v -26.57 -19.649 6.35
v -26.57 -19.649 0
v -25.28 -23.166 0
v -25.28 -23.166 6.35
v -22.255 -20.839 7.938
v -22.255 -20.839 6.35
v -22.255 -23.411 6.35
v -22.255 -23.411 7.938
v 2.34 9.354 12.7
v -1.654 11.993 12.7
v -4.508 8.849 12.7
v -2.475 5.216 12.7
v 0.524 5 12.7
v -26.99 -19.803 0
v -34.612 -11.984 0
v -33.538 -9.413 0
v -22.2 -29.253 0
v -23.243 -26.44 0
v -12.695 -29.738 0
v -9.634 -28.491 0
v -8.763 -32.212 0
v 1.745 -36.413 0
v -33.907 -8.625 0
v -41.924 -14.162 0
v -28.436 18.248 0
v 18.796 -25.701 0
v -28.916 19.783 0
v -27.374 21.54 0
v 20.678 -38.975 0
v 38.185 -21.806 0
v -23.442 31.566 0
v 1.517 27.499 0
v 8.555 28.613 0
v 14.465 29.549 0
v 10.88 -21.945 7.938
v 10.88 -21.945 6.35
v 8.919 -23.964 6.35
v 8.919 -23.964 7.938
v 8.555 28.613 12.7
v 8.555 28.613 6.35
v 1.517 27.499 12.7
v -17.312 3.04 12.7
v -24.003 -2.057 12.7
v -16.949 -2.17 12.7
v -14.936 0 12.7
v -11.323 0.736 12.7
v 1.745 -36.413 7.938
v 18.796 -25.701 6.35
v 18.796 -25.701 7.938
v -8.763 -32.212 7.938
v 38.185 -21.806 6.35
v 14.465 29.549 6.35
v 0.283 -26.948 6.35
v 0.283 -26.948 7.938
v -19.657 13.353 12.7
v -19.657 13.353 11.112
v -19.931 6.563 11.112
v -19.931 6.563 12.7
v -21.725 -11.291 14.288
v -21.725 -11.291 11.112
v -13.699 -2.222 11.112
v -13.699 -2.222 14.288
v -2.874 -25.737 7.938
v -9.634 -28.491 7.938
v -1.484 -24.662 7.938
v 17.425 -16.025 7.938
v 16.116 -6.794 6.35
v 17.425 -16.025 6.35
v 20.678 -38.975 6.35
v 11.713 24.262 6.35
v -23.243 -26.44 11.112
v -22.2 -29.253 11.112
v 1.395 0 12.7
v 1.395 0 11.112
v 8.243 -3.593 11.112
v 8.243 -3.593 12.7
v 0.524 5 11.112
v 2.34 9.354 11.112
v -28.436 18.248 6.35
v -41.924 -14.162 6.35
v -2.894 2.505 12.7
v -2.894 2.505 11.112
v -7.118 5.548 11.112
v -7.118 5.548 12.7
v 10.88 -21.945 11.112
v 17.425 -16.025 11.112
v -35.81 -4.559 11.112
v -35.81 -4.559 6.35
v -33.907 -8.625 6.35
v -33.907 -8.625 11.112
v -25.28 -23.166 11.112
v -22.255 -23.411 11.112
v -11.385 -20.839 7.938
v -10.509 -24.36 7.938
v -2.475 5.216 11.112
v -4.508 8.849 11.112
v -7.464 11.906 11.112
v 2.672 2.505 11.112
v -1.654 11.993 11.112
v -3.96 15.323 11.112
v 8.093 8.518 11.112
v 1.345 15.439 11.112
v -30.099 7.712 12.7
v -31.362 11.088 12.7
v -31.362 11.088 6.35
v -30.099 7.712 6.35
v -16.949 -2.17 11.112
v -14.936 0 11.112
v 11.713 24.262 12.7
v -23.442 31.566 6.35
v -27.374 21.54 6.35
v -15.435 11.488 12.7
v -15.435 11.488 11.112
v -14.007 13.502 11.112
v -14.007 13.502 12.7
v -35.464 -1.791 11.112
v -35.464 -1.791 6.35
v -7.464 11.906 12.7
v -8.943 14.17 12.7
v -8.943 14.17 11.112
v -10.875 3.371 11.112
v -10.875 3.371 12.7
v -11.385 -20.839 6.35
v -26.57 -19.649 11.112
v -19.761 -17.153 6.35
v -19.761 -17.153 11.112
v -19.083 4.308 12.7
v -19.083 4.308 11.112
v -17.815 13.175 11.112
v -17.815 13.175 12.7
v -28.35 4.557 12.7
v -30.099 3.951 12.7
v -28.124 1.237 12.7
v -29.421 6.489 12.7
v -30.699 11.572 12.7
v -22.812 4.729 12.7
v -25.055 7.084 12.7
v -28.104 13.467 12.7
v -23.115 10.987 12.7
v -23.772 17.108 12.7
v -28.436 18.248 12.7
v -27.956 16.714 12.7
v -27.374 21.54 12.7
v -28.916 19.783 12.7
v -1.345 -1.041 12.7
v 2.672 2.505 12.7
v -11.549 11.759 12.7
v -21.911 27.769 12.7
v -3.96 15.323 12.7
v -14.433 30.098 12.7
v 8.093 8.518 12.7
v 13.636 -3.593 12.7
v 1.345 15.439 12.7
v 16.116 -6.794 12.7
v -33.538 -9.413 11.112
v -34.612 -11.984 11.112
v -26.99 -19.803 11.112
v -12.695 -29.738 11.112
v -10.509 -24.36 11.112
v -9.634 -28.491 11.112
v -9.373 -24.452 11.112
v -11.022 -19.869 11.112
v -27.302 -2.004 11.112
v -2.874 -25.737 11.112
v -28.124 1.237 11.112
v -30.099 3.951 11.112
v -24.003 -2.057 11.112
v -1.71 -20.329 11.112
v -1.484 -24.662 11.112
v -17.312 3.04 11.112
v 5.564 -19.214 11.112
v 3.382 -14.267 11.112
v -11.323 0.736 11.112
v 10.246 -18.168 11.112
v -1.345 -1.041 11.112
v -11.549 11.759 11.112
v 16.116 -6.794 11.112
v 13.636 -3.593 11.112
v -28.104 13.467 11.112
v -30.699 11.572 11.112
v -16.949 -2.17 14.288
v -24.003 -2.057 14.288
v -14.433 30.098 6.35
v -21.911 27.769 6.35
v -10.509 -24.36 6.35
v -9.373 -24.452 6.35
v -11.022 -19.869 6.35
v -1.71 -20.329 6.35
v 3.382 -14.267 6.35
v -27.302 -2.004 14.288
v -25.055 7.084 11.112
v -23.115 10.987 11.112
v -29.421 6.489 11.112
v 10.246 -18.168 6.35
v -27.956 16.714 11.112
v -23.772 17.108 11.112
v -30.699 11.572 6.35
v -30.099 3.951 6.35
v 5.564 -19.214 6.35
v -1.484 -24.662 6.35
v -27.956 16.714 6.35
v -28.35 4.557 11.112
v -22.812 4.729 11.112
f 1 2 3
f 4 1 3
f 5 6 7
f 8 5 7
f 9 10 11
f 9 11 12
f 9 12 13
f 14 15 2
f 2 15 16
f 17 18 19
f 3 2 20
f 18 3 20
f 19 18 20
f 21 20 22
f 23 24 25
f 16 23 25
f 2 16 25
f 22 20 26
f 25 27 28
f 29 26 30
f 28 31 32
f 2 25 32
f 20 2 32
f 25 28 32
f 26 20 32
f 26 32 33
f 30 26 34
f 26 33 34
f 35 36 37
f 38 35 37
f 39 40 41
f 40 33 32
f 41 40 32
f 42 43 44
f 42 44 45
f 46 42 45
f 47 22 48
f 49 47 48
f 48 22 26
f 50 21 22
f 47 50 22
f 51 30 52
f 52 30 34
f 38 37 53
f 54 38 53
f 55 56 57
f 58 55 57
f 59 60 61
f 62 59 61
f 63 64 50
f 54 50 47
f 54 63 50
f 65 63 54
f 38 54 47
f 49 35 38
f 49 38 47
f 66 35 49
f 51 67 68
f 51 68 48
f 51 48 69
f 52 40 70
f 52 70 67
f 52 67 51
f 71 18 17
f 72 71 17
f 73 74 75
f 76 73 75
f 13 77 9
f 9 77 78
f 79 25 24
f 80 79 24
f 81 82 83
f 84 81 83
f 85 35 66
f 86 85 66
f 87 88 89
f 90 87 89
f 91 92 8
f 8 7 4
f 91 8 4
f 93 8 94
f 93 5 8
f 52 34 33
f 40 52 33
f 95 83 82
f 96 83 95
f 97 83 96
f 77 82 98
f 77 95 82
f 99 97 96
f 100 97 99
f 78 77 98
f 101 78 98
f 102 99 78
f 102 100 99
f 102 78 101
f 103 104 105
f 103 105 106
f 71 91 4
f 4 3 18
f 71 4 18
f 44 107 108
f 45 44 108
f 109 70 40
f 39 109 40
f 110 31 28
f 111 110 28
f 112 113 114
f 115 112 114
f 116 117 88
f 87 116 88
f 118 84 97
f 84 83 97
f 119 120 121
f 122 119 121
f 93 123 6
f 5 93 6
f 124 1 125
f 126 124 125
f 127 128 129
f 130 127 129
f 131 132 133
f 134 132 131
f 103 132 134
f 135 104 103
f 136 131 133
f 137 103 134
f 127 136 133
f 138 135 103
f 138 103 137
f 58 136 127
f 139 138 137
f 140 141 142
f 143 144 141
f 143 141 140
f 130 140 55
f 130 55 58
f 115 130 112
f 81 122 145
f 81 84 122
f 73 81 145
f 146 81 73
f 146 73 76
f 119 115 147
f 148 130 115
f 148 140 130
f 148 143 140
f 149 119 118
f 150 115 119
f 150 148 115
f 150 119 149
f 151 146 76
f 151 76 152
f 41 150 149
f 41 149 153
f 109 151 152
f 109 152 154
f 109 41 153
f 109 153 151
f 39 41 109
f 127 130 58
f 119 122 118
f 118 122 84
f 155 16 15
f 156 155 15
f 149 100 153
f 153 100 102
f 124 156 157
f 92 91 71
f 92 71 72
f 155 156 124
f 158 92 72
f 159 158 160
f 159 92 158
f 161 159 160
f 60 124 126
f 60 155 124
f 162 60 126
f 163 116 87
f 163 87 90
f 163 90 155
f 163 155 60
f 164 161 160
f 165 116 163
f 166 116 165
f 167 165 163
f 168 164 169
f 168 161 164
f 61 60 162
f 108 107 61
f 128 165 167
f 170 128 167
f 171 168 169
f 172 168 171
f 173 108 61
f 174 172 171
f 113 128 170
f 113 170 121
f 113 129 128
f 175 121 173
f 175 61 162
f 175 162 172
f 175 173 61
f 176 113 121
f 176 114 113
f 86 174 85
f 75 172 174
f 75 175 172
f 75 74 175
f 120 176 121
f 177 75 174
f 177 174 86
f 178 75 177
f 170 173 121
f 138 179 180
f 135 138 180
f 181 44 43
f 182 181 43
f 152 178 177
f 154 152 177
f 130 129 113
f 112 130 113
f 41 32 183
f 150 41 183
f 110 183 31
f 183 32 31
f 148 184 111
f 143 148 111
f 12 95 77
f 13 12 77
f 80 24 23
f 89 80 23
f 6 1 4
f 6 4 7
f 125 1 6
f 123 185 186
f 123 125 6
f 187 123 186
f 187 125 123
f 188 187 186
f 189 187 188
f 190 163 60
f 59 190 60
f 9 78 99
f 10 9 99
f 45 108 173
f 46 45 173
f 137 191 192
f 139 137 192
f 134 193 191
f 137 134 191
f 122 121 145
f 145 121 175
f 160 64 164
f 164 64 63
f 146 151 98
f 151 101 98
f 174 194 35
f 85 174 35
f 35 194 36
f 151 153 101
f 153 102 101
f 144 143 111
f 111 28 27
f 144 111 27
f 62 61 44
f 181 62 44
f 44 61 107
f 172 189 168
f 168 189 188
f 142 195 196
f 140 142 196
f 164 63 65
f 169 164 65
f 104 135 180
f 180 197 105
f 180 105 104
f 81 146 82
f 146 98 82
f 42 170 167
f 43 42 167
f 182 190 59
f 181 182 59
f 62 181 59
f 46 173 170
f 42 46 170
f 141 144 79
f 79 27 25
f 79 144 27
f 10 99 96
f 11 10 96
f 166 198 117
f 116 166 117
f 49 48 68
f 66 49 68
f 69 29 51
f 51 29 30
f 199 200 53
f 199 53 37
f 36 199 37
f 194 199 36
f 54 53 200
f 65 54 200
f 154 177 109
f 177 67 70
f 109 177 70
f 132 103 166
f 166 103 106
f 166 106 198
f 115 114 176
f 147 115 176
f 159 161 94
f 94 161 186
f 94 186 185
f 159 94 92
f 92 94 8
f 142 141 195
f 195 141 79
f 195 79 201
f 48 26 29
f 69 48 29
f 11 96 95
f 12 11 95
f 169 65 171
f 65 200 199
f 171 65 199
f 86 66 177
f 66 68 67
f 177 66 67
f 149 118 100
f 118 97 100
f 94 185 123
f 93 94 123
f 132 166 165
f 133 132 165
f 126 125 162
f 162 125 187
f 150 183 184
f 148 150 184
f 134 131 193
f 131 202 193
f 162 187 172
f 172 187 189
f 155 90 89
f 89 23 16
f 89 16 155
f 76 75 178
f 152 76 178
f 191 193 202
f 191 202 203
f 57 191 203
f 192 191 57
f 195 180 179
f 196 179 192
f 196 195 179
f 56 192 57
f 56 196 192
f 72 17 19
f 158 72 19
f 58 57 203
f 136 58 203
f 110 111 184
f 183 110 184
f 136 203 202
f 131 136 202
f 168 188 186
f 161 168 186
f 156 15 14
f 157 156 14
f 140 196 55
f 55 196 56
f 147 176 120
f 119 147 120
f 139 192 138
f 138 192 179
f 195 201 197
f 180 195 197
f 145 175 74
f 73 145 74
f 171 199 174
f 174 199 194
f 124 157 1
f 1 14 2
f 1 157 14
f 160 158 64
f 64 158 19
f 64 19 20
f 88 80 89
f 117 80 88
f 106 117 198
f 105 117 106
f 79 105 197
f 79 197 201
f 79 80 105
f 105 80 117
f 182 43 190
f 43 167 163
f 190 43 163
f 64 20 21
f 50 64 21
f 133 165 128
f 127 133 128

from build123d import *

# Parameters (mm, degrees)
F1_DEPTH = 6.35
F2_DEPTH = 7.9375
F3_DEPTH = 9.525
F4_DEPTH = 11.1125
F5_DEPTH = 12.7
F6_DEPTH = 14.2875
F7_DEPTH = 1.5875
F8_DEPTH = 1.5875


with BuildPart() as f1:
    # F0 (on Top) → F1 (new body)
    with BuildSketch(Plane.XY):
        Polygon((-35.8103439212, -4.5593217947), (-33.9071340859, -8.6252652109), (-33.5384329894, -9.412943883), (-34.6120148897, -11.9838882238), (-26.9895140082, -19.8032855988), (-26.5695869222, -19.6492926364), (-19.7610929608, -17.1525254846), (-11.0217193142, -19.8685638607), (3.3818825614, -14.2671633512), (-1.7102999846, -20.329285413), (-9.3728229403, -24.4515277445), (-10.5090038238, -24.3597326853), (-22.254801242, -23.410758639), (-25.2798311412, -23.1663584709), (-23.24295789, -26.4399051666), (-22.2002733499, -29.25273031), (-12.6948654652, -29.7376997769), (-9.6338509958, -28.4906197353), (-2.8742274735, -25.7366988808), (-1.4843321561, -24.6623260829), (5.5642467923, -19.2138571292), (10.2457571775, -18.1676670909), (10.8801592141, -21.945245564), (17.4245349995, -16.0254287724), (16.1157045513, -6.7941471934), (13.6357676238, -3.5932986066), (8.2433465868, -3.5932986066), (1.394683728, 0), (-1.3447812526, -1.0412705597), (-10.875236243, 3.3707101829), (-8.9431926608, 14.169969596), (-11.5485337064, 11.7590313642), (-14.0071965859, 13.5024469656), (-15.4354972765, 11.4881768823), (-17.8145058453, 13.1751103327), (-19.0833117813, 4.3078940362), (-28.1235463917, 1.2368093012), (-30.0988443196, 3.9512561634), (-35.4643054307, -1.7910201568), align=None)
        Polygon((-13.6989112943, -2.2222886328), (-21.7251610011, -11.2912235782), (-27.302313596, -2.0040527452), (-24.003424822, -2.0569759701), (-17.311938107, 3.0396326911), (-11.3225607201, 0.7360266754), (-14.9355856702, 0), (-16.9485407512, -2.1701556624), align=None, mode=Mode.SUBTRACT)
        Polygon((-27.3744759216, 21.5401743719), (-28.9157517254, 19.7830181569), (-28.4356558695, 18.2484276593), (-27.9555600137, 16.7138371617), (-23.7718690187, 17.1082001179), (-19.6567643434, 13.3531671017), (-19.9311058968, 6.5632439218), (-22.8116791695, 4.7285929322), (-28.3499248326, 4.5571303926), (-29.4209925105, 6.4892523833), (-30.0988443196, 7.7120438218), (-30.0988443196, 3.9512561634), (-28.1235463917, 1.2368093012), (-19.0833117813, 4.3078940362), (-17.8145058453, 13.1751103327), (-15.4354972765, 11.4881768823), (-14.0071965859, 13.5024469656), (-11.5485337064, 11.7590313642), (-8.9431926608, 14.169969596), (-10.875236243, 3.3707101829), (-1.3447812526, -1.0412705597), (1.394683728, 0), (8.2433465868, -3.5932986066), (13.6357676238, -3.5932986066), (16.1157045513, -6.7941471934), (11.7125554425, 24.2616013296), (8.5552403661, 28.6131991288), (1.5173847093, 27.499334136), (-14.4329823518, 30.0980165206), (-21.9111200422, 27.7687609196), align=None)
        Polygon((-7.1180537343, 5.5476040579), (-7.4640917592, 11.9060464203), (-3.9604599588, 15.3231685981), (1.3454514556, 15.4385138303), (8.0931866542, 8.5177607834), (2.6719293091, 2.5053559802), (-2.8935102746, 2.5053559802), align=None, mode=Mode.SUBTRACT)
        Polygon((14.4653307977, 29.548575351), (8.5552403661, 28.6131991288), (11.7125554425, 24.2616013296), (16.1157045513, -6.7941471934), (17.4245349995, -16.0254287724), (18.7963797011, -25.7011547155), (20.6783857611, -38.9750878654), (38.1850010487, -21.8061160352), align=None)
        Polygon((18.7963797011, -25.7011547155), (17.4245349995, -16.0254287724), (10.8801592141, -21.945245564), (8.9192790911, -23.9637978375), (0.2827544813, -26.9483719021), (-1.4843321561, -24.6623260829), (-2.8742274735, -25.7366988808), (-9.6338509958, -28.4906197353), (-8.7630180642, -32.2120897472), (1.7449631123, -36.4130362868), align=None)
        Polygon((-3.9604599588, 15.3231685981), (-7.4640917592, 11.9060464203), (-7.1180537343, 5.5476040579), (-2.8935102746, 2.5053559802), (2.6719293091, 2.5053559802), (8.0931866542, 8.5177607834), (1.3454514556, 15.4385138303), align=None)
        Polygon((-2.4753811304, 5.2159847692), (-4.5083528385, 8.8493805379), (-1.6535416944, 11.9925569743), (2.3403100204, 9.3540186062), (0.5236121942, 4.9997111782), align=None, mode=Mode.SUBTRACT)
        Polygon((-19.7610929608, -17.1525254846), (-26.5695869222, -19.6492926364), (-25.2798311412, -23.1663584709), (-22.254801242, -23.410758639), (-22.254801242, -20.8385027945), (-11.3854473457, -20.8385027945), (-10.5090038238, -24.3597326853), (-9.3728229403, -24.4515277445), (-1.7102999846, -20.329285413), (3.3818825614, -14.2671633512), (-11.0217193142, -19.8685638607), align=None)
        Polygon((-27.9555600137, 16.7138371617), (-28.4356558695, 18.2484276593), (-41.9236756861, -14.1618680209), (-33.9071340859, -8.6252652109), (-35.8103439212, -4.5593217947), (-35.4643054307, -1.7910201568), (-30.0988443196, 3.9512561634), (-30.0988443196, 7.7120438218), (-31.3622131944, 11.0882837325), (-30.6994514223, 11.5721586804), align=None)
        Polygon((-23.7718690187, 17.1082001179), (-27.9555600137, 16.7138371617), (-30.6994514223, 11.5721586804), (-28.1036924571, 13.4672932327), (-23.1149829924, 10.9873563051), (-25.0553801825, 7.0839998448), (-29.4209925105, 6.4892523833), (-28.3499248326, 4.5571303926), (-22.8116791695, 4.7285929322), (-19.9311058968, 6.5632439218), (-19.6567643434, 13.3531671017), align=None)
        Polygon((-27.302313596, -2.0040527452), (-21.7251610011, -11.2912235782), (-13.6989112943, -2.2222886328), (-16.9485407512, -2.1701556624), (-24.003424822, -2.0569759701), align=None)
        Polygon((8.9192790911, -23.9637978375), (10.8801592141, -21.945245564), (10.2457571775, -18.1676670909), (5.5642467923, -19.2138571292), (-1.4843321561, -24.6623260829), (0.2827544813, -26.9483719021), align=None)
        Polygon((-28.1036924571, 13.4672932327), (-30.6994514223, 11.5721586804), (-31.3622131944, 11.0882837325), (-30.0988443196, 7.7120438218), (-29.4209925105, 6.4892523833), (-25.0553801825, 7.0839998448), (-23.1149829924, 10.9873563051), align=None)
        Polygon((-22.254801242, -20.8385027945), (-22.254801242, -23.410758639), (-10.5090038238, -24.3597326853), (-11.3854473457, -20.8385027945), align=None)
        Polygon((-23.4421584755, 31.5658189356), (-27.3744759216, 21.5401743719), (-21.9111200422, 27.7687609196), (-14.4329823518, 30.0980165206), align=None)
        Polygon((-24.003424822, -2.0569759701), (-16.9485407512, -2.1701556624), (-14.9355856702, 0), (-11.3225607201, 0.7360266754), (-17.311938107, 3.0396326911), align=None)
        Polygon((-1.6535416944, 11.9925569743), (-4.5083528385, 8.8493805379), (-2.4753811304, 5.2159847692), (0.5236121942, 4.9997111782), (2.3403100204, 9.3540186062), align=None)
    extrude(amount=F1_DEPTH)

    # F0 (on Top) → F2 (join)
    with BuildSketch(Plane.XY):
        Polygon((-35.8103439212, -4.5593217947), (-33.9071340859, -8.6252652109), (-33.5384329894, -9.412943883), (-34.6120148897, -11.9838882238), (-26.9895140082, -19.8032855988), (-26.5695869222, -19.6492926364), (-19.7610929608, -17.1525254846), (-11.0217193142, -19.8685638607), (3.3818825614, -14.2671633512), (-1.7102999846, -20.329285413), (-9.3728229403, -24.4515277445), (-10.5090038238, -24.3597326853), (-22.254801242, -23.410758639), (-25.2798311412, -23.1663584709), (-23.24295789, -26.4399051666), (-22.2002733499, -29.25273031), (-12.6948654652, -29.7376997769), (-9.6338509958, -28.4906197353), (-2.8742274735, -25.7366988808), (-1.4843321561, -24.6623260829), (5.5642467923, -19.2138571292), (10.2457571775, -18.1676670909), (10.8801592141, -21.945245564), (17.4245349995, -16.0254287724), (16.1157045513, -6.7941471934), (13.6357676238, -3.5932986066), (8.2433465868, -3.5932986066), (1.394683728, 0), (-1.3447812526, -1.0412705597), (-10.875236243, 3.3707101829), (-8.9431926608, 14.169969596), (-11.5485337064, 11.7590313642), (-14.0071965859, 13.5024469656), (-15.4354972765, 11.4881768823), (-17.8145058453, 13.1751103327), (-19.0833117813, 4.3078940362), (-28.1235463917, 1.2368093012), (-30.0988443196, 3.9512561634), (-35.4643054307, -1.7910201568), align=None)
        Polygon((-13.6989112943, -2.2222886328), (-21.7251610011, -11.2912235782), (-27.302313596, -2.0040527452), (-24.003424822, -2.0569759701), (-17.311938107, 3.0396326911), (-11.3225607201, 0.7360266754), (-14.9355856702, 0), (-16.9485407512, -2.1701556624), align=None, mode=Mode.SUBTRACT)
        Polygon((-27.3744759216, 21.5401743719), (-28.9157517254, 19.7830181569), (-28.4356558695, 18.2484276593), (-27.9555600137, 16.7138371617), (-23.7718690187, 17.1082001179), (-19.6567643434, 13.3531671017), (-19.9311058968, 6.5632439218), (-22.8116791695, 4.7285929322), (-28.3499248326, 4.5571303926), (-29.4209925105, 6.4892523833), (-30.0988443196, 7.7120438218), (-30.0988443196, 3.9512561634), (-28.1235463917, 1.2368093012), (-19.0833117813, 4.3078940362), (-17.8145058453, 13.1751103327), (-15.4354972765, 11.4881768823), (-14.0071965859, 13.5024469656), (-11.5485337064, 11.7590313642), (-8.9431926608, 14.169969596), (-10.875236243, 3.3707101829), (-1.3447812526, -1.0412705597), (1.394683728, 0), (8.2433465868, -3.5932986066), (13.6357676238, -3.5932986066), (16.1157045513, -6.7941471934), (11.7125554425, 24.2616013296), (8.5552403661, 28.6131991288), (1.5173847093, 27.499334136), (-14.4329823518, 30.0980165206), (-21.9111200422, 27.7687609196), align=None)
        Polygon((-7.1180537343, 5.5476040579), (-7.4640917592, 11.9060464203), (-3.9604599588, 15.3231685981), (1.3454514556, 15.4385138303), (8.0931866542, 8.5177607834), (2.6719293091, 2.5053559802), (-2.8935102746, 2.5053559802), align=None, mode=Mode.SUBTRACT)
        Polygon((-22.254801242, -20.8385027945), (-22.254801242, -23.410758639), (-10.5090038238, -24.3597326853), (-11.3854473457, -20.8385027945), align=None)
        Polygon((-28.1036924571, 13.4672932327), (-30.6994514223, 11.5721586804), (-31.3622131944, 11.0882837325), (-30.0988443196, 7.7120438218), (-29.4209925105, 6.4892523833), (-25.0553801825, 7.0839998448), (-23.1149829924, 10.9873563051), align=None)
        Polygon((-1.6535416944, 11.9925569743), (-4.5083528385, 8.8493805379), (-2.4753811304, 5.2159847692), (0.5236121942, 4.9997111782), (2.3403100204, 9.3540186062), align=None)
        Polygon((-24.003424822, -2.0569759701), (-16.9485407512, -2.1701556624), (-14.9355856702, 0), (-11.3225607201, 0.7360266754), (-17.311938107, 3.0396326911), align=None)
        Polygon((-27.302313596, -2.0040527452), (-21.7251610011, -11.2912235782), (-13.6989112943, -2.2222886328), (-16.9485407512, -2.1701556624), (-24.003424822, -2.0569759701), align=None)
        Polygon((18.7963797011, -25.7011547155), (17.4245349995, -16.0254287724), (10.8801592141, -21.945245564), (8.9192790911, -23.9637978375), (0.2827544813, -26.9483719021), (-1.4843321561, -24.6623260829), (-2.8742274735, -25.7366988808), (-9.6338509958, -28.4906197353), (-8.7630180642, -32.2120897472), (1.7449631123, -36.4130362868), align=None)
    extrude(amount=F2_DEPTH)

    # F0 (on Top) → F3 (join)
    with BuildSketch(Plane.XY):
        Polygon((-35.8103439212, -4.5593217947), (-33.9071340859, -8.6252652109), (-33.5384329894, -9.412943883), (-34.6120148897, -11.9838882238), (-26.9895140082, -19.8032855988), (-26.5695869222, -19.6492926364), (-19.7610929608, -17.1525254846), (-11.0217193142, -19.8685638607), (3.3818825614, -14.2671633512), (-1.7102999846, -20.329285413), (-9.3728229403, -24.4515277445), (-10.5090038238, -24.3597326853), (-22.254801242, -23.410758639), (-25.2798311412, -23.1663584709), (-23.24295789, -26.4399051666), (-22.2002733499, -29.25273031), (-12.6948654652, -29.7376997769), (-9.6338509958, -28.4906197353), (-2.8742274735, -25.7366988808), (-1.4843321561, -24.6623260829), (5.5642467923, -19.2138571292), (10.2457571775, -18.1676670909), (10.8801592141, -21.945245564), (17.4245349995, -16.0254287724), (16.1157045513, -6.7941471934), (13.6357676238, -3.5932986066), (8.2433465868, -3.5932986066), (1.394683728, 0), (-1.3447812526, -1.0412705597), (-10.875236243, 3.3707101829), (-8.9431926608, 14.169969596), (-11.5485337064, 11.7590313642), (-14.0071965859, 13.5024469656), (-15.4354972765, 11.4881768823), (-17.8145058453, 13.1751103327), (-19.0833117813, 4.3078940362), (-28.1235463917, 1.2368093012), (-30.0988443196, 3.9512561634), (-35.4643054307, -1.7910201568), align=None)
        Polygon((-13.6989112943, -2.2222886328), (-21.7251610011, -11.2912235782), (-27.302313596, -2.0040527452), (-24.003424822, -2.0569759701), (-17.311938107, 3.0396326911), (-11.3225607201, 0.7360266754), (-14.9355856702, 0), (-16.9485407512, -2.1701556624), align=None, mode=Mode.SUBTRACT)
        Polygon((-27.3744759216, 21.5401743719), (-28.9157517254, 19.7830181569), (-28.4356558695, 18.2484276593), (-27.9555600137, 16.7138371617), (-23.7718690187, 17.1082001179), (-19.6567643434, 13.3531671017), (-19.9311058968, 6.5632439218), (-22.8116791695, 4.7285929322), (-28.3499248326, 4.5571303926), (-29.4209925105, 6.4892523833), (-30.0988443196, 7.7120438218), (-30.0988443196, 3.9512561634), (-28.1235463917, 1.2368093012), (-19.0833117813, 4.3078940362), (-17.8145058453, 13.1751103327), (-15.4354972765, 11.4881768823), (-14.0071965859, 13.5024469656), (-11.5485337064, 11.7590313642), (-8.9431926608, 14.169969596), (-10.875236243, 3.3707101829), (-1.3447812526, -1.0412705597), (1.394683728, 0), (8.2433465868, -3.5932986066), (13.6357676238, -3.5932986066), (16.1157045513, -6.7941471934), (11.7125554425, 24.2616013296), (8.5552403661, 28.6131991288), (1.5173847093, 27.499334136), (-14.4329823518, 30.0980165206), (-21.9111200422, 27.7687609196), align=None)
        Polygon((-7.1180537343, 5.5476040579), (-7.4640917592, 11.9060464203), (-3.9604599588, 15.3231685981), (1.3454514556, 15.4385138303), (8.0931866542, 8.5177607834), (2.6719293091, 2.5053559802), (-2.8935102746, 2.5053559802), align=None, mode=Mode.SUBTRACT)
        Polygon((-3.9604599588, 15.3231685981), (-7.4640917592, 11.9060464203), (-7.1180537343, 5.5476040579), (-2.8935102746, 2.5053559802), (2.6719293091, 2.5053559802), (8.0931866542, 8.5177607834), (1.3454514556, 15.4385138303), align=None)
        Polygon((-2.4753811304, 5.2159847692), (-4.5083528385, 8.8493805379), (-1.6535416944, 11.9925569743), (2.3403100204, 9.3540186062), (0.5236121942, 4.9997111782), align=None, mode=Mode.SUBTRACT)
        Polygon((-23.7718690187, 17.1082001179), (-27.9555600137, 16.7138371617), (-30.6994514223, 11.5721586804), (-28.1036924571, 13.4672932327), (-23.1149829924, 10.9873563051), (-25.0553801825, 7.0839998448), (-29.4209925105, 6.4892523833), (-28.3499248326, 4.5571303926), (-22.8116791695, 4.7285929322), (-19.9311058968, 6.5632439218), (-19.6567643434, 13.3531671017), align=None)
        Polygon((-27.302313596, -2.0040527452), (-21.7251610011, -11.2912235782), (-13.6989112943, -2.2222886328), (-16.9485407512, -2.1701556624), (-24.003424822, -2.0569759701), align=None)
        Polygon((-28.1036924571, 13.4672932327), (-30.6994514223, 11.5721586804), (-31.3622131944, 11.0882837325), (-30.0988443196, 7.7120438218), (-29.4209925105, 6.4892523833), (-25.0553801825, 7.0839998448), (-23.1149829924, 10.9873563051), align=None)
        Polygon((-24.003424822, -2.0569759701), (-16.9485407512, -2.1701556624), (-14.9355856702, 0), (-11.3225607201, 0.7360266754), (-17.311938107, 3.0396326911), align=None)
        Polygon((-1.6535416944, 11.9925569743), (-4.5083528385, 8.8493805379), (-2.4753811304, 5.2159847692), (0.5236121942, 4.9997111782), (2.3403100204, 9.3540186062), align=None)
    extrude(amount=F3_DEPTH)

    # F0 (on Top) → F4 (join)
    with BuildSketch(Plane.XY):
        Polygon((-35.8103439212, -4.5593217947), (-33.9071340859, -8.6252652109), (-33.5384329894, -9.412943883), (-34.6120148897, -11.9838882238), (-26.9895140082, -19.8032855988), (-26.5695869222, -19.6492926364), (-19.7610929608, -17.1525254846), (-11.0217193142, -19.8685638607), (3.3818825614, -14.2671633512), (-1.7102999846, -20.329285413), (-9.3728229403, -24.4515277445), (-10.5090038238, -24.3597326853), (-22.254801242, -23.410758639), (-25.2798311412, -23.1663584709), (-23.24295789, -26.4399051666), (-22.2002733499, -29.25273031), (-12.6948654652, -29.7376997769), (-9.6338509958, -28.4906197353), (-2.8742274735, -25.7366988808), (-1.4843321561, -24.6623260829), (5.5642467923, -19.2138571292), (10.2457571775, -18.1676670909), (10.8801592141, -21.945245564), (17.4245349995, -16.0254287724), (16.1157045513, -6.7941471934), (13.6357676238, -3.5932986066), (8.2433465868, -3.5932986066), (1.394683728, 0), (-1.3447812526, -1.0412705597), (-10.875236243, 3.3707101829), (-8.9431926608, 14.169969596), (-11.5485337064, 11.7590313642), (-14.0071965859, 13.5024469656), (-15.4354972765, 11.4881768823), (-17.8145058453, 13.1751103327), (-19.0833117813, 4.3078940362), (-28.1235463917, 1.2368093012), (-30.0988443196, 3.9512561634), (-35.4643054307, -1.7910201568), align=None)
        Polygon((-13.6989112943, -2.2222886328), (-21.7251610011, -11.2912235782), (-27.302313596, -2.0040527452), (-24.003424822, -2.0569759701), (-17.311938107, 3.0396326911), (-11.3225607201, 0.7360266754), (-14.9355856702, 0), (-16.9485407512, -2.1701556624), align=None, mode=Mode.SUBTRACT)
        Polygon((-27.302313596, -2.0040527452), (-21.7251610011, -11.2912235782), (-13.6989112943, -2.2222886328), (-16.9485407512, -2.1701556624), (-24.003424822, -2.0569759701), align=None)
        Polygon((-24.003424822, -2.0569759701), (-16.9485407512, -2.1701556624), (-14.9355856702, 0), (-11.3225607201, 0.7360266754), (-17.311938107, 3.0396326911), align=None)
        Polygon((-27.3744759216, 21.5401743719), (-28.9157517254, 19.7830181569), (-28.4356558695, 18.2484276593), (-27.9555600137, 16.7138371617), (-23.7718690187, 17.1082001179), (-19.6567643434, 13.3531671017), (-19.9311058968, 6.5632439218), (-22.8116791695, 4.7285929322), (-28.3499248326, 4.5571303926), (-29.4209925105, 6.4892523833), (-30.0988443196, 7.7120438218), (-30.0988443196, 3.9512561634), (-28.1235463917, 1.2368093012), (-19.0833117813, 4.3078940362), (-17.8145058453, 13.1751103327), (-15.4354972765, 11.4881768823), (-14.0071965859, 13.5024469656), (-11.5485337064, 11.7590313642), (-8.9431926608, 14.169969596), (-10.875236243, 3.3707101829), (-1.3447812526, -1.0412705597), (1.394683728, 0), (8.2433465868, -3.5932986066), (13.6357676238, -3.5932986066), (16.1157045513, -6.7941471934), (11.7125554425, 24.2616013296), (8.5552403661, 28.6131991288), (1.5173847093, 27.499334136), (-14.4329823518, 30.0980165206), (-21.9111200422, 27.7687609196), align=None)
        Polygon((-7.1180537343, 5.5476040579), (-7.4640917592, 11.9060464203), (-3.9604599588, 15.3231685981), (1.3454514556, 15.4385138303), (8.0931866542, 8.5177607834), (2.6719293091, 2.5053559802), (-2.8935102746, 2.5053559802), align=None, mode=Mode.SUBTRACT)
        Polygon((-28.1036924571, 13.4672932327), (-30.6994514223, 11.5721586804), (-31.3622131944, 11.0882837325), (-30.0988443196, 7.7120438218), (-29.4209925105, 6.4892523833), (-25.0553801825, 7.0839998448), (-23.1149829924, 10.9873563051), align=None)
        Polygon((-1.6535416944, 11.9925569743), (-4.5083528385, 8.8493805379), (-2.4753811304, 5.2159847692), (0.5236121942, 4.9997111782), (2.3403100204, 9.3540186062), align=None)
    extrude(amount=F4_DEPTH)

    # F0 (on Top) → F5 (join)
    with BuildSketch(Plane.XY):
        Polygon((-27.3744759216, 21.5401743719), (-28.9157517254, 19.7830181569), (-28.4356558695, 18.2484276593), (-27.9555600137, 16.7138371617), (-23.7718690187, 17.1082001179), (-19.6567643434, 13.3531671017), (-19.9311058968, 6.5632439218), (-22.8116791695, 4.7285929322), (-28.3499248326, 4.5571303926), (-29.4209925105, 6.4892523833), (-30.0988443196, 7.7120438218), (-30.0988443196, 3.9512561634), (-28.1235463917, 1.2368093012), (-19.0833117813, 4.3078940362), (-17.8145058453, 13.1751103327), (-15.4354972765, 11.4881768823), (-14.0071965859, 13.5024469656), (-11.5485337064, 11.7590313642), (-8.9431926608, 14.169969596), (-10.875236243, 3.3707101829), (-1.3447812526, -1.0412705597), (1.394683728, 0), (8.2433465868, -3.5932986066), (13.6357676238, -3.5932986066), (16.1157045513, -6.7941471934), (11.7125554425, 24.2616013296), (8.5552403661, 28.6131991288), (1.5173847093, 27.499334136), (-14.4329823518, 30.0980165206), (-21.9111200422, 27.7687609196), align=None)
        Polygon((-7.1180537343, 5.5476040579), (-7.4640917592, 11.9060464203), (-3.9604599588, 15.3231685981), (1.3454514556, 15.4385138303), (8.0931866542, 8.5177607834), (2.6719293091, 2.5053559802), (-2.8935102746, 2.5053559802), align=None, mode=Mode.SUBTRACT)
        Polygon((-24.003424822, -2.0569759701), (-16.9485407512, -2.1701556624), (-14.9355856702, 0), (-11.3225607201, 0.7360266754), (-17.311938107, 3.0396326911), align=None)
        Polygon((-27.302313596, -2.0040527452), (-21.7251610011, -11.2912235782), (-13.6989112943, -2.2222886328), (-16.9485407512, -2.1701556624), (-24.003424822, -2.0569759701), align=None)
    extrude(amount=F5_DEPTH)

    # F0 (on Top) → F6 (join)
    with BuildSketch(Plane.XY):
        Polygon((-27.302313596, -2.0040527452), (-21.7251610011, -11.2912235782), (-13.6989112943, -2.2222886328), (-16.9485407512, -2.1701556624), (-24.003424822, -2.0569759701), align=None)
    extrude(amount=F6_DEPTH)

    # F7 (add, through all): faces of the model
    f7_faces = [f1.faces().sort_by_distance(p)[0] for p in [
        (-27.4220636925, 9.8497741622, 11.1125),
        (-1.0757104764, 8.2793181779, 11.1125),
    ]]
    extrude(f7_faces, amount=F7_DEPTH)

    # F8 (add, through all): faces of the model
    f8_faces = [f1.faces().sort_by_distance(p)[0] for p in [
        (-25.8480259435, 16.7445827735, 9.525),
        (4.5744647012, 11.8369042916, 9.525),
    ]]
    extrude(f8_faces, amount=F8_DEPTH)


solid = f1.part
